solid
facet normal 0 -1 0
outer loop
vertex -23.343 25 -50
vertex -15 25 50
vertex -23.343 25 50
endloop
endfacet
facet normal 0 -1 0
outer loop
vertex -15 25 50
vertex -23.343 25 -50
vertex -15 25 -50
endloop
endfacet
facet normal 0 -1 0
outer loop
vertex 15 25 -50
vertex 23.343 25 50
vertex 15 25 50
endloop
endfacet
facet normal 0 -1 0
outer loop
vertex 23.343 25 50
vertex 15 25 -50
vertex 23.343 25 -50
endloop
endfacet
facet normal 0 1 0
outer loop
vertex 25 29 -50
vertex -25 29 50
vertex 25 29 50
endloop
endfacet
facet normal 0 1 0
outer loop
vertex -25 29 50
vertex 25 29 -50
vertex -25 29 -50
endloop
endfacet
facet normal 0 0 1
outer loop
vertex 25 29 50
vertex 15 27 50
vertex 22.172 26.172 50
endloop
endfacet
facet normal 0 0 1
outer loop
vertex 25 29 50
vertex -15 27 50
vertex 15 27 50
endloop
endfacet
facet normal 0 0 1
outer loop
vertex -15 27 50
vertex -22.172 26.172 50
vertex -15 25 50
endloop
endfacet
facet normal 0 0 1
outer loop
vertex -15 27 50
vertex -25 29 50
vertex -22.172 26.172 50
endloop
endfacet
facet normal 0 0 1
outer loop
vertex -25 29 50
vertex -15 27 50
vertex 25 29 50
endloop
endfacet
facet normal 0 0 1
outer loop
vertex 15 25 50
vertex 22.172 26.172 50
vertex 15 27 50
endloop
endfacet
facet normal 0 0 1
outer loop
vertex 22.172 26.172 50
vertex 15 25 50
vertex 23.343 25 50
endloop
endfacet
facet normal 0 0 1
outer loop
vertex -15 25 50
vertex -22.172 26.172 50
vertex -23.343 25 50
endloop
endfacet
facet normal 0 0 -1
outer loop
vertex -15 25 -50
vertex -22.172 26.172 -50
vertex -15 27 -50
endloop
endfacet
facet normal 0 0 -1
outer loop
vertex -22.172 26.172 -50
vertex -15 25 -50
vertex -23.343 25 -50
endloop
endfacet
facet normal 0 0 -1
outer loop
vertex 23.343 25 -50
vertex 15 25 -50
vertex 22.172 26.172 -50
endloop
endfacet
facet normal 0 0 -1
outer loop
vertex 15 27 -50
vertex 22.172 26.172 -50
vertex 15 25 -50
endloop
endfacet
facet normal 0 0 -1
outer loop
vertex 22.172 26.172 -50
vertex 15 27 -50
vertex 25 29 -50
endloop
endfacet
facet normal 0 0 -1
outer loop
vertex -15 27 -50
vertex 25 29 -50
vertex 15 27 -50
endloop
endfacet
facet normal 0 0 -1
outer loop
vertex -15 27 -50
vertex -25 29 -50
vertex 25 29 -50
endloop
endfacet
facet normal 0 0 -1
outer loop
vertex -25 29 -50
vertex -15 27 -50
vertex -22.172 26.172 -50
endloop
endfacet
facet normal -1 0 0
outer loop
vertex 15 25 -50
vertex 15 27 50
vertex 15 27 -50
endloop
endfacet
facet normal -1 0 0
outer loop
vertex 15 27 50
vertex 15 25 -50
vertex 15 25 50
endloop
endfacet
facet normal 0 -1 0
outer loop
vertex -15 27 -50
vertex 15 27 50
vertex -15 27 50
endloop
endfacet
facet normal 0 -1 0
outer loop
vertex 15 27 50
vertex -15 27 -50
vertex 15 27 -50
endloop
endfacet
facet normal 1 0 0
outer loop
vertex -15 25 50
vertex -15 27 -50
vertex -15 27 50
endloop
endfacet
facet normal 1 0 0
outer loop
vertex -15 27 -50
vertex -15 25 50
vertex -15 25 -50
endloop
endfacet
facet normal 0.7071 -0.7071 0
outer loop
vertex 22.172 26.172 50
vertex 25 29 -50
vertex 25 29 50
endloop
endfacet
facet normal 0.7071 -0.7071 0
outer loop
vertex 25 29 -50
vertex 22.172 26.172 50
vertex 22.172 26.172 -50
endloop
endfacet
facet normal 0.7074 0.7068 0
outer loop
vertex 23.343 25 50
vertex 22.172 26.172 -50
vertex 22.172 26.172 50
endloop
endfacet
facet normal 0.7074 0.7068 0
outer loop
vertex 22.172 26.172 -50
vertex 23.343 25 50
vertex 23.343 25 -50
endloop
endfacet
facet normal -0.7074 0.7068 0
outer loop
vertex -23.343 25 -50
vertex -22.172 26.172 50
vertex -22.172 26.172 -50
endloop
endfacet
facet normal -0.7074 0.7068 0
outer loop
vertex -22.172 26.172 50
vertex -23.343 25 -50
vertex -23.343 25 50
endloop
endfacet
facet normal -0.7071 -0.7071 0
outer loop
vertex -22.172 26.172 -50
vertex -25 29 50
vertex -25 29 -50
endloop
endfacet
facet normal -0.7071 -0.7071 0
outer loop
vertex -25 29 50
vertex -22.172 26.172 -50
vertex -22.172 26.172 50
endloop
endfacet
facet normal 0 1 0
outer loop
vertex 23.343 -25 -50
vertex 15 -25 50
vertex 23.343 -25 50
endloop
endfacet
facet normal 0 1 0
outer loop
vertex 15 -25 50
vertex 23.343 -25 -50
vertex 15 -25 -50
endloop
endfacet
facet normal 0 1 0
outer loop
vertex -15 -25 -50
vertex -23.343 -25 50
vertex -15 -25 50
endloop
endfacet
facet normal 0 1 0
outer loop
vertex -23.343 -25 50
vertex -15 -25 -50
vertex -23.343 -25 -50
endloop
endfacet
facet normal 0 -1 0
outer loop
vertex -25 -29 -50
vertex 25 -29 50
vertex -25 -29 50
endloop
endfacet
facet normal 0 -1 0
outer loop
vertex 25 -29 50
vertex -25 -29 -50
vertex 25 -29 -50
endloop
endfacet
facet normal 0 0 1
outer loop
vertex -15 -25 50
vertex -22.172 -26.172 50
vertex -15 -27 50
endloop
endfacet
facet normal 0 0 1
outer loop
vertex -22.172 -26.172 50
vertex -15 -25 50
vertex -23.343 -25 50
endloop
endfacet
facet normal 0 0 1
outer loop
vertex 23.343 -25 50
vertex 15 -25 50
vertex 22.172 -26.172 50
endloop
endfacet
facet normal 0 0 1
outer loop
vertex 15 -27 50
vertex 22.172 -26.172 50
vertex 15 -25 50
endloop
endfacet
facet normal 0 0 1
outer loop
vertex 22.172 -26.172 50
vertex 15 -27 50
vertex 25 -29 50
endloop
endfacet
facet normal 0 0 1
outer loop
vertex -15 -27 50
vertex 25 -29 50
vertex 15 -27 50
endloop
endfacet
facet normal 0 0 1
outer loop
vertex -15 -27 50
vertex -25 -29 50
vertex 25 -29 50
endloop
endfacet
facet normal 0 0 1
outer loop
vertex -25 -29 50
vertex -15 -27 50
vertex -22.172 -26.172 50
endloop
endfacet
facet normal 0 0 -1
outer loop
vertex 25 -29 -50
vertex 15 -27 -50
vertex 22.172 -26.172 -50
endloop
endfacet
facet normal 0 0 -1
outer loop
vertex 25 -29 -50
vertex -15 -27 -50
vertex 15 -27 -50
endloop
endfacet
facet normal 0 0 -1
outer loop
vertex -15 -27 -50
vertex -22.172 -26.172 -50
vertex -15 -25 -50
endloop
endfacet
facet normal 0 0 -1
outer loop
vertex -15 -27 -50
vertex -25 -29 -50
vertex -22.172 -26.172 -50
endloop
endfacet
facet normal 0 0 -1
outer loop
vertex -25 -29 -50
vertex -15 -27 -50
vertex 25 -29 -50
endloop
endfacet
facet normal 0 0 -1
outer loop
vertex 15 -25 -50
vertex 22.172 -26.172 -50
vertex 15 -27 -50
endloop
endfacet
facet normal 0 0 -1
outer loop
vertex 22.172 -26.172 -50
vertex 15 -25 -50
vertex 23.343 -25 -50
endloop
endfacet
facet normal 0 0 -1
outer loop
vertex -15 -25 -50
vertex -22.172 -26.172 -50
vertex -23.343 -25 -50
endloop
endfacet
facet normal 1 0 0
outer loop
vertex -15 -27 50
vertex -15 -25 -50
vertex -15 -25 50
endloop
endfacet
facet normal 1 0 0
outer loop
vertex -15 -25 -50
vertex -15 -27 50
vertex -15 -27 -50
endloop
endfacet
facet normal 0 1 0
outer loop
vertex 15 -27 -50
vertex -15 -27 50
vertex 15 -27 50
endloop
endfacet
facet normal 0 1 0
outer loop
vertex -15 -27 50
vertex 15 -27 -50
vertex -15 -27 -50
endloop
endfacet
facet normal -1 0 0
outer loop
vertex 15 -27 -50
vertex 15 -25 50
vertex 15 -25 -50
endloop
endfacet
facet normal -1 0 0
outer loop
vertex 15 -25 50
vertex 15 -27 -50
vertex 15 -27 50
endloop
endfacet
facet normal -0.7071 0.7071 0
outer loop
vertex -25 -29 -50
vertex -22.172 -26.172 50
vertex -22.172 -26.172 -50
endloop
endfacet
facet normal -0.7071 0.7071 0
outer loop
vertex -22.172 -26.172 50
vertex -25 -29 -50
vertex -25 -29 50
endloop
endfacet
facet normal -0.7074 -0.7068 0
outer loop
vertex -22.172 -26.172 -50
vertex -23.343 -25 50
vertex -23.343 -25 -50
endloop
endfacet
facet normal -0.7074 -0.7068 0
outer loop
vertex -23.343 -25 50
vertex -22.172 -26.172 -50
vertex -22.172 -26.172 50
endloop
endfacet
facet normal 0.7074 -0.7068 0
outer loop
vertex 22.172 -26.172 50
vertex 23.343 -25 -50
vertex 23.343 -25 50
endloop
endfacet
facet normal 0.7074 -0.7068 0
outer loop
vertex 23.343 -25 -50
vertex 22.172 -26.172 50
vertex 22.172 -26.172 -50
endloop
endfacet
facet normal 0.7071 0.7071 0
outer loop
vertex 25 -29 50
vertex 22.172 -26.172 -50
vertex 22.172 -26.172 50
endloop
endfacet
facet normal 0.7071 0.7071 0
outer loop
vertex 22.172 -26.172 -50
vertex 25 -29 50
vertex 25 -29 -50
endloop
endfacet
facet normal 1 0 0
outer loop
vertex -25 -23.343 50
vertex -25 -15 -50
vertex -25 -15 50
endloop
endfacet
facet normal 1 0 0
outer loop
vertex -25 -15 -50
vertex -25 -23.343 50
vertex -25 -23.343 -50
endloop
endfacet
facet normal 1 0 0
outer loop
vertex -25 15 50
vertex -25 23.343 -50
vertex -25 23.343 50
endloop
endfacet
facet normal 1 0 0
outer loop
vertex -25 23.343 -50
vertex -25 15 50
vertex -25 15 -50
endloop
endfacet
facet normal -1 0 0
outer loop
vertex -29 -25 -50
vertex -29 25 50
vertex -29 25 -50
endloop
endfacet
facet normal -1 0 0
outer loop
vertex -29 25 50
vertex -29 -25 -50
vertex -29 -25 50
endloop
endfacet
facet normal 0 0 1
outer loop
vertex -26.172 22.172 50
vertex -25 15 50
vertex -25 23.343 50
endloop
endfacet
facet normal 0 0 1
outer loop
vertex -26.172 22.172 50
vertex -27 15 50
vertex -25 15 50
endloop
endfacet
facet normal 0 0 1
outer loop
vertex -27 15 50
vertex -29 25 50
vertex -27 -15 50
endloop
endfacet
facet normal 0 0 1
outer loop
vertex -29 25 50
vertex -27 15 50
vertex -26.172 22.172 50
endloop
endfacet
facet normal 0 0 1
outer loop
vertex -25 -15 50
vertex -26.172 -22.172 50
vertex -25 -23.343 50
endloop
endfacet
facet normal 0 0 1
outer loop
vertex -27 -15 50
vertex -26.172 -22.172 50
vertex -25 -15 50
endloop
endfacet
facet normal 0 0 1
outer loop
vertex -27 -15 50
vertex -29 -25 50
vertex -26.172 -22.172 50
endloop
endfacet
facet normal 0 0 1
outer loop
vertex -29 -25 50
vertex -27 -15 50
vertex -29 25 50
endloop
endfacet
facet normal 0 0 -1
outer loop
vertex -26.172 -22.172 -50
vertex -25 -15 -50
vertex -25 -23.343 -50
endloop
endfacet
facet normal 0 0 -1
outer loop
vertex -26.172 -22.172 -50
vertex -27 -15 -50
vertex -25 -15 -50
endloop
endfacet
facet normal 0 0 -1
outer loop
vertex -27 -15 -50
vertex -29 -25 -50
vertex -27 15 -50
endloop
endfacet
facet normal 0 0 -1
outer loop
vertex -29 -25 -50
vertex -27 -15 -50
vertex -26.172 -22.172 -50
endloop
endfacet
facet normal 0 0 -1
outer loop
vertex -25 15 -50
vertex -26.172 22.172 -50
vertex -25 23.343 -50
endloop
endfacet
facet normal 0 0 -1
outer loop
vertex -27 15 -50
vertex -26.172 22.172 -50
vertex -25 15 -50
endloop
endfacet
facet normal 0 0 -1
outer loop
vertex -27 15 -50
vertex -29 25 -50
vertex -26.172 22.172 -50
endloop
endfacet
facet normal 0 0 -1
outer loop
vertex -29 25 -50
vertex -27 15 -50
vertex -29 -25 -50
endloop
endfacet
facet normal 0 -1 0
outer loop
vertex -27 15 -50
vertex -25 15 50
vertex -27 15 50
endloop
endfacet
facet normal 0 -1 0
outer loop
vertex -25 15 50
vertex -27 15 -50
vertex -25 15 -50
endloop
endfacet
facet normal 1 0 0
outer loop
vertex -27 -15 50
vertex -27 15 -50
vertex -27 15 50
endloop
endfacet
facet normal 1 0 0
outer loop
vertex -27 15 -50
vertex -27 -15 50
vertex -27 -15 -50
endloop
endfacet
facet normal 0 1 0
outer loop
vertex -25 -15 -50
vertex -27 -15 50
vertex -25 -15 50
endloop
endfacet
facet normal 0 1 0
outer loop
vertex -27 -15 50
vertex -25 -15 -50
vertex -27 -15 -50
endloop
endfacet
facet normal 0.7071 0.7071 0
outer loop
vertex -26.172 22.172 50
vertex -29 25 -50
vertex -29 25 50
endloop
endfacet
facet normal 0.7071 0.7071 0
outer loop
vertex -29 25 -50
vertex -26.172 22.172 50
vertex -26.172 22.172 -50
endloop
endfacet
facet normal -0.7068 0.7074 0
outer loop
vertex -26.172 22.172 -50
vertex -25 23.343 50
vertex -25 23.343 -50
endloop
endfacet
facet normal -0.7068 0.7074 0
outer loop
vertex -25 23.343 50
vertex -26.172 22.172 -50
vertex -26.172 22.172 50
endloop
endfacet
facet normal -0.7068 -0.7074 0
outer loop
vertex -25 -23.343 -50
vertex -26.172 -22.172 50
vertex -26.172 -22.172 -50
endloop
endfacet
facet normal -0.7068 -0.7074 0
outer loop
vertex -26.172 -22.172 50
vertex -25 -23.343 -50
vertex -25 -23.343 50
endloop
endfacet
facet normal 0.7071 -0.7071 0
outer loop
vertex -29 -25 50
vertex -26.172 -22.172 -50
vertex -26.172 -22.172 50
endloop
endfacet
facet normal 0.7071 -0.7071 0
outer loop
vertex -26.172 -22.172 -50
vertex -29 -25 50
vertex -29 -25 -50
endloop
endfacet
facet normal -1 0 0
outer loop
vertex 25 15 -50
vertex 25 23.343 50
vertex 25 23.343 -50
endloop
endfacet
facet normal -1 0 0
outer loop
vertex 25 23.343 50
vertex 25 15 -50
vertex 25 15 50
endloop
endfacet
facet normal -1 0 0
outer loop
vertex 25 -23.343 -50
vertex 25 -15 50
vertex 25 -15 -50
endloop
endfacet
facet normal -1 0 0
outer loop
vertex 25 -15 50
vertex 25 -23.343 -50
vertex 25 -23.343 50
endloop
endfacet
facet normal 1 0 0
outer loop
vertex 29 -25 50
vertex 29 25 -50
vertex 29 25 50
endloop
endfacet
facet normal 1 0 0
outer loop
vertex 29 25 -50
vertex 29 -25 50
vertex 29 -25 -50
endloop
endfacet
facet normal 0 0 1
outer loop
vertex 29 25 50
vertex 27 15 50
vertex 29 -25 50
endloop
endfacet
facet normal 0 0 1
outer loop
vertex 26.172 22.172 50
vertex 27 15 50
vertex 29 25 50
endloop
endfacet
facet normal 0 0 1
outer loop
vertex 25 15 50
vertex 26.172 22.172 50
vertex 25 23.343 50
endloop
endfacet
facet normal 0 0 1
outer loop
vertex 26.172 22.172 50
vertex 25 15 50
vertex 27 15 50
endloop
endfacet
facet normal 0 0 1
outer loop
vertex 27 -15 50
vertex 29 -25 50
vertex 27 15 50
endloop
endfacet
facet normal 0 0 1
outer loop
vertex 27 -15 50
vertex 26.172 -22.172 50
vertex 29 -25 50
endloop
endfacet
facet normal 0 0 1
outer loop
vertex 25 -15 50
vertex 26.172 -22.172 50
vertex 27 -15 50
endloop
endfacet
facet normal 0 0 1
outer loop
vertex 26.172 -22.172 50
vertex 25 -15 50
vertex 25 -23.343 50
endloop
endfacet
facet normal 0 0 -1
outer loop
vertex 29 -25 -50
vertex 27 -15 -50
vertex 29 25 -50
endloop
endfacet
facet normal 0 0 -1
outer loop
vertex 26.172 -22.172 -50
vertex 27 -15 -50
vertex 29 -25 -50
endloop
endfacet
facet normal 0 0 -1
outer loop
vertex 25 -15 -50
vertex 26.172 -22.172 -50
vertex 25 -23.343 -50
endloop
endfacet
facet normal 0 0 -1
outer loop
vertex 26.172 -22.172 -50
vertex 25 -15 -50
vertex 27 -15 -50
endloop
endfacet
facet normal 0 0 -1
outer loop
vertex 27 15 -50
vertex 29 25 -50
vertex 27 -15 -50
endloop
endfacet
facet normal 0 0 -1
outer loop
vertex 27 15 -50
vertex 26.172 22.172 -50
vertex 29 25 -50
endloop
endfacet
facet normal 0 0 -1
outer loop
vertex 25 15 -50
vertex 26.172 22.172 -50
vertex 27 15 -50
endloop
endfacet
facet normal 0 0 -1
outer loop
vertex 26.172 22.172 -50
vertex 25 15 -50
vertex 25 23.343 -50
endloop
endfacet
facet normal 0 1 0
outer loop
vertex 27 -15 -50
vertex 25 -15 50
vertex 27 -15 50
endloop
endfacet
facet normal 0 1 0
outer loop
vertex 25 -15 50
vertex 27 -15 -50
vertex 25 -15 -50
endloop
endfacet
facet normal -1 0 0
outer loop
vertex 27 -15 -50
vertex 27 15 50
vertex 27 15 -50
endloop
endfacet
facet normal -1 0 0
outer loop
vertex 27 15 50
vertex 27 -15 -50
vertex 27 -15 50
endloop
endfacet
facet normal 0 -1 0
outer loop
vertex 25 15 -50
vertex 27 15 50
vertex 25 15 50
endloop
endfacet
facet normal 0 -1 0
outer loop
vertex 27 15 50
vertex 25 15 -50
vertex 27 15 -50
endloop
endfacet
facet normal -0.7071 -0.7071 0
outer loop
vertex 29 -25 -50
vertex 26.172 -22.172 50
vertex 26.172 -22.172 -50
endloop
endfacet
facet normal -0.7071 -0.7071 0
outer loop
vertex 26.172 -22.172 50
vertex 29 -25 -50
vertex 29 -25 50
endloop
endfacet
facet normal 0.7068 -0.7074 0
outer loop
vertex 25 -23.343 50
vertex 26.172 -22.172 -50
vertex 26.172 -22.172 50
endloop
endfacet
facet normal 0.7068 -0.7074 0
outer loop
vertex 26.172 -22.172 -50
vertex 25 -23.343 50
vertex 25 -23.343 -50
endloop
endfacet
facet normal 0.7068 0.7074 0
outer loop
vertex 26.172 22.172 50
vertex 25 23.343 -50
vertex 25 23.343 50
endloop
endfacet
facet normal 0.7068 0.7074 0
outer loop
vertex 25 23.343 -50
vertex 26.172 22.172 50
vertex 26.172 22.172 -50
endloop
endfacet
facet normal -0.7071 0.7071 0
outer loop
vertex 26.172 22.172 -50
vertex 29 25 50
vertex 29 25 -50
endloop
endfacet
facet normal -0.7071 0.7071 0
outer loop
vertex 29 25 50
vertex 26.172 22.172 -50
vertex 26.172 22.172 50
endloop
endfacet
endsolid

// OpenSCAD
$fn = 64;

THICKNESS = 2;
SIZE_X = 50;
SIZE_Y = 100;
MARGIN = THICKNESS * 5;
NUM_HOLES = 0;

module LampShadePanelMainShape()
{
    difference()
    {
        difference()
        {
            cube([SIZE_X, SIZE_Y, THICKNESS * 2], center=true);

            translate([0, 0, THICKNESS])
            cube([SIZE_X - MARGIN * 2, SIZE_Y, THICKNESS * 2], center=true);
        }

        translate([SIZE_X / 2, SIZE_Y / -2, -THICKNESS])
        rotate([0, 360-45, 0])
        cube([MARGIN, SIZE_Y, THICKNESS * 2]);

        translate([SIZE_X / -2, SIZE_Y / 2, -THICKNESS])
        rotate([0, 360-45, 180])
        cube([MARGIN*3, SIZE_Y, THICKNESS * 2]);
    }
}

module LampShadePanel()
{
    //difference()
    {
        LampShadePanelMainShape();

        for (a = [0 : 1 : NUM_HOLES - 1])
        {
            x = MARGIN + rands(0, SIZE_X - MARGIN * 2, 3)[0] - SIZE_X / 2;
            y = MARGIN + rands(0, SIZE_Y - MARGIN * 2, 3)[0] - SIZE_Y / 2;

            color(rands(0, 1.0, 3))
            translate([x, y, -THICKNESS*2])
            rotate(rands(0, 90, 3) - [45, 45, 45])
            cylinder(r=rands(0.1, 1.5 ,1)[0], h=THICKNESS*5);
        }
    }
}

module LampShadeBox()
{
    color("red")  translate([0, SIZE_X /  2 + THICKNESS, 0]) rotate([90, 0,   0]) LampShadePanel();
    color("red")  translate([0, SIZE_X / -2 - THICKNESS, 0]) rotate([90, 0, 180]) LampShadePanel();
    color("blue") translate([SIZE_X / -2 - THICKNESS, 0, 0]) rotate([90, 0,  90]) LampShadePanel();
    color("blue") translate([SIZE_X /  2 + THICKNESS, 0, 0]) rotate([90, 0, 270]) LampShadePanel();
}

//LampShadePanel();
LampShadeBox();
